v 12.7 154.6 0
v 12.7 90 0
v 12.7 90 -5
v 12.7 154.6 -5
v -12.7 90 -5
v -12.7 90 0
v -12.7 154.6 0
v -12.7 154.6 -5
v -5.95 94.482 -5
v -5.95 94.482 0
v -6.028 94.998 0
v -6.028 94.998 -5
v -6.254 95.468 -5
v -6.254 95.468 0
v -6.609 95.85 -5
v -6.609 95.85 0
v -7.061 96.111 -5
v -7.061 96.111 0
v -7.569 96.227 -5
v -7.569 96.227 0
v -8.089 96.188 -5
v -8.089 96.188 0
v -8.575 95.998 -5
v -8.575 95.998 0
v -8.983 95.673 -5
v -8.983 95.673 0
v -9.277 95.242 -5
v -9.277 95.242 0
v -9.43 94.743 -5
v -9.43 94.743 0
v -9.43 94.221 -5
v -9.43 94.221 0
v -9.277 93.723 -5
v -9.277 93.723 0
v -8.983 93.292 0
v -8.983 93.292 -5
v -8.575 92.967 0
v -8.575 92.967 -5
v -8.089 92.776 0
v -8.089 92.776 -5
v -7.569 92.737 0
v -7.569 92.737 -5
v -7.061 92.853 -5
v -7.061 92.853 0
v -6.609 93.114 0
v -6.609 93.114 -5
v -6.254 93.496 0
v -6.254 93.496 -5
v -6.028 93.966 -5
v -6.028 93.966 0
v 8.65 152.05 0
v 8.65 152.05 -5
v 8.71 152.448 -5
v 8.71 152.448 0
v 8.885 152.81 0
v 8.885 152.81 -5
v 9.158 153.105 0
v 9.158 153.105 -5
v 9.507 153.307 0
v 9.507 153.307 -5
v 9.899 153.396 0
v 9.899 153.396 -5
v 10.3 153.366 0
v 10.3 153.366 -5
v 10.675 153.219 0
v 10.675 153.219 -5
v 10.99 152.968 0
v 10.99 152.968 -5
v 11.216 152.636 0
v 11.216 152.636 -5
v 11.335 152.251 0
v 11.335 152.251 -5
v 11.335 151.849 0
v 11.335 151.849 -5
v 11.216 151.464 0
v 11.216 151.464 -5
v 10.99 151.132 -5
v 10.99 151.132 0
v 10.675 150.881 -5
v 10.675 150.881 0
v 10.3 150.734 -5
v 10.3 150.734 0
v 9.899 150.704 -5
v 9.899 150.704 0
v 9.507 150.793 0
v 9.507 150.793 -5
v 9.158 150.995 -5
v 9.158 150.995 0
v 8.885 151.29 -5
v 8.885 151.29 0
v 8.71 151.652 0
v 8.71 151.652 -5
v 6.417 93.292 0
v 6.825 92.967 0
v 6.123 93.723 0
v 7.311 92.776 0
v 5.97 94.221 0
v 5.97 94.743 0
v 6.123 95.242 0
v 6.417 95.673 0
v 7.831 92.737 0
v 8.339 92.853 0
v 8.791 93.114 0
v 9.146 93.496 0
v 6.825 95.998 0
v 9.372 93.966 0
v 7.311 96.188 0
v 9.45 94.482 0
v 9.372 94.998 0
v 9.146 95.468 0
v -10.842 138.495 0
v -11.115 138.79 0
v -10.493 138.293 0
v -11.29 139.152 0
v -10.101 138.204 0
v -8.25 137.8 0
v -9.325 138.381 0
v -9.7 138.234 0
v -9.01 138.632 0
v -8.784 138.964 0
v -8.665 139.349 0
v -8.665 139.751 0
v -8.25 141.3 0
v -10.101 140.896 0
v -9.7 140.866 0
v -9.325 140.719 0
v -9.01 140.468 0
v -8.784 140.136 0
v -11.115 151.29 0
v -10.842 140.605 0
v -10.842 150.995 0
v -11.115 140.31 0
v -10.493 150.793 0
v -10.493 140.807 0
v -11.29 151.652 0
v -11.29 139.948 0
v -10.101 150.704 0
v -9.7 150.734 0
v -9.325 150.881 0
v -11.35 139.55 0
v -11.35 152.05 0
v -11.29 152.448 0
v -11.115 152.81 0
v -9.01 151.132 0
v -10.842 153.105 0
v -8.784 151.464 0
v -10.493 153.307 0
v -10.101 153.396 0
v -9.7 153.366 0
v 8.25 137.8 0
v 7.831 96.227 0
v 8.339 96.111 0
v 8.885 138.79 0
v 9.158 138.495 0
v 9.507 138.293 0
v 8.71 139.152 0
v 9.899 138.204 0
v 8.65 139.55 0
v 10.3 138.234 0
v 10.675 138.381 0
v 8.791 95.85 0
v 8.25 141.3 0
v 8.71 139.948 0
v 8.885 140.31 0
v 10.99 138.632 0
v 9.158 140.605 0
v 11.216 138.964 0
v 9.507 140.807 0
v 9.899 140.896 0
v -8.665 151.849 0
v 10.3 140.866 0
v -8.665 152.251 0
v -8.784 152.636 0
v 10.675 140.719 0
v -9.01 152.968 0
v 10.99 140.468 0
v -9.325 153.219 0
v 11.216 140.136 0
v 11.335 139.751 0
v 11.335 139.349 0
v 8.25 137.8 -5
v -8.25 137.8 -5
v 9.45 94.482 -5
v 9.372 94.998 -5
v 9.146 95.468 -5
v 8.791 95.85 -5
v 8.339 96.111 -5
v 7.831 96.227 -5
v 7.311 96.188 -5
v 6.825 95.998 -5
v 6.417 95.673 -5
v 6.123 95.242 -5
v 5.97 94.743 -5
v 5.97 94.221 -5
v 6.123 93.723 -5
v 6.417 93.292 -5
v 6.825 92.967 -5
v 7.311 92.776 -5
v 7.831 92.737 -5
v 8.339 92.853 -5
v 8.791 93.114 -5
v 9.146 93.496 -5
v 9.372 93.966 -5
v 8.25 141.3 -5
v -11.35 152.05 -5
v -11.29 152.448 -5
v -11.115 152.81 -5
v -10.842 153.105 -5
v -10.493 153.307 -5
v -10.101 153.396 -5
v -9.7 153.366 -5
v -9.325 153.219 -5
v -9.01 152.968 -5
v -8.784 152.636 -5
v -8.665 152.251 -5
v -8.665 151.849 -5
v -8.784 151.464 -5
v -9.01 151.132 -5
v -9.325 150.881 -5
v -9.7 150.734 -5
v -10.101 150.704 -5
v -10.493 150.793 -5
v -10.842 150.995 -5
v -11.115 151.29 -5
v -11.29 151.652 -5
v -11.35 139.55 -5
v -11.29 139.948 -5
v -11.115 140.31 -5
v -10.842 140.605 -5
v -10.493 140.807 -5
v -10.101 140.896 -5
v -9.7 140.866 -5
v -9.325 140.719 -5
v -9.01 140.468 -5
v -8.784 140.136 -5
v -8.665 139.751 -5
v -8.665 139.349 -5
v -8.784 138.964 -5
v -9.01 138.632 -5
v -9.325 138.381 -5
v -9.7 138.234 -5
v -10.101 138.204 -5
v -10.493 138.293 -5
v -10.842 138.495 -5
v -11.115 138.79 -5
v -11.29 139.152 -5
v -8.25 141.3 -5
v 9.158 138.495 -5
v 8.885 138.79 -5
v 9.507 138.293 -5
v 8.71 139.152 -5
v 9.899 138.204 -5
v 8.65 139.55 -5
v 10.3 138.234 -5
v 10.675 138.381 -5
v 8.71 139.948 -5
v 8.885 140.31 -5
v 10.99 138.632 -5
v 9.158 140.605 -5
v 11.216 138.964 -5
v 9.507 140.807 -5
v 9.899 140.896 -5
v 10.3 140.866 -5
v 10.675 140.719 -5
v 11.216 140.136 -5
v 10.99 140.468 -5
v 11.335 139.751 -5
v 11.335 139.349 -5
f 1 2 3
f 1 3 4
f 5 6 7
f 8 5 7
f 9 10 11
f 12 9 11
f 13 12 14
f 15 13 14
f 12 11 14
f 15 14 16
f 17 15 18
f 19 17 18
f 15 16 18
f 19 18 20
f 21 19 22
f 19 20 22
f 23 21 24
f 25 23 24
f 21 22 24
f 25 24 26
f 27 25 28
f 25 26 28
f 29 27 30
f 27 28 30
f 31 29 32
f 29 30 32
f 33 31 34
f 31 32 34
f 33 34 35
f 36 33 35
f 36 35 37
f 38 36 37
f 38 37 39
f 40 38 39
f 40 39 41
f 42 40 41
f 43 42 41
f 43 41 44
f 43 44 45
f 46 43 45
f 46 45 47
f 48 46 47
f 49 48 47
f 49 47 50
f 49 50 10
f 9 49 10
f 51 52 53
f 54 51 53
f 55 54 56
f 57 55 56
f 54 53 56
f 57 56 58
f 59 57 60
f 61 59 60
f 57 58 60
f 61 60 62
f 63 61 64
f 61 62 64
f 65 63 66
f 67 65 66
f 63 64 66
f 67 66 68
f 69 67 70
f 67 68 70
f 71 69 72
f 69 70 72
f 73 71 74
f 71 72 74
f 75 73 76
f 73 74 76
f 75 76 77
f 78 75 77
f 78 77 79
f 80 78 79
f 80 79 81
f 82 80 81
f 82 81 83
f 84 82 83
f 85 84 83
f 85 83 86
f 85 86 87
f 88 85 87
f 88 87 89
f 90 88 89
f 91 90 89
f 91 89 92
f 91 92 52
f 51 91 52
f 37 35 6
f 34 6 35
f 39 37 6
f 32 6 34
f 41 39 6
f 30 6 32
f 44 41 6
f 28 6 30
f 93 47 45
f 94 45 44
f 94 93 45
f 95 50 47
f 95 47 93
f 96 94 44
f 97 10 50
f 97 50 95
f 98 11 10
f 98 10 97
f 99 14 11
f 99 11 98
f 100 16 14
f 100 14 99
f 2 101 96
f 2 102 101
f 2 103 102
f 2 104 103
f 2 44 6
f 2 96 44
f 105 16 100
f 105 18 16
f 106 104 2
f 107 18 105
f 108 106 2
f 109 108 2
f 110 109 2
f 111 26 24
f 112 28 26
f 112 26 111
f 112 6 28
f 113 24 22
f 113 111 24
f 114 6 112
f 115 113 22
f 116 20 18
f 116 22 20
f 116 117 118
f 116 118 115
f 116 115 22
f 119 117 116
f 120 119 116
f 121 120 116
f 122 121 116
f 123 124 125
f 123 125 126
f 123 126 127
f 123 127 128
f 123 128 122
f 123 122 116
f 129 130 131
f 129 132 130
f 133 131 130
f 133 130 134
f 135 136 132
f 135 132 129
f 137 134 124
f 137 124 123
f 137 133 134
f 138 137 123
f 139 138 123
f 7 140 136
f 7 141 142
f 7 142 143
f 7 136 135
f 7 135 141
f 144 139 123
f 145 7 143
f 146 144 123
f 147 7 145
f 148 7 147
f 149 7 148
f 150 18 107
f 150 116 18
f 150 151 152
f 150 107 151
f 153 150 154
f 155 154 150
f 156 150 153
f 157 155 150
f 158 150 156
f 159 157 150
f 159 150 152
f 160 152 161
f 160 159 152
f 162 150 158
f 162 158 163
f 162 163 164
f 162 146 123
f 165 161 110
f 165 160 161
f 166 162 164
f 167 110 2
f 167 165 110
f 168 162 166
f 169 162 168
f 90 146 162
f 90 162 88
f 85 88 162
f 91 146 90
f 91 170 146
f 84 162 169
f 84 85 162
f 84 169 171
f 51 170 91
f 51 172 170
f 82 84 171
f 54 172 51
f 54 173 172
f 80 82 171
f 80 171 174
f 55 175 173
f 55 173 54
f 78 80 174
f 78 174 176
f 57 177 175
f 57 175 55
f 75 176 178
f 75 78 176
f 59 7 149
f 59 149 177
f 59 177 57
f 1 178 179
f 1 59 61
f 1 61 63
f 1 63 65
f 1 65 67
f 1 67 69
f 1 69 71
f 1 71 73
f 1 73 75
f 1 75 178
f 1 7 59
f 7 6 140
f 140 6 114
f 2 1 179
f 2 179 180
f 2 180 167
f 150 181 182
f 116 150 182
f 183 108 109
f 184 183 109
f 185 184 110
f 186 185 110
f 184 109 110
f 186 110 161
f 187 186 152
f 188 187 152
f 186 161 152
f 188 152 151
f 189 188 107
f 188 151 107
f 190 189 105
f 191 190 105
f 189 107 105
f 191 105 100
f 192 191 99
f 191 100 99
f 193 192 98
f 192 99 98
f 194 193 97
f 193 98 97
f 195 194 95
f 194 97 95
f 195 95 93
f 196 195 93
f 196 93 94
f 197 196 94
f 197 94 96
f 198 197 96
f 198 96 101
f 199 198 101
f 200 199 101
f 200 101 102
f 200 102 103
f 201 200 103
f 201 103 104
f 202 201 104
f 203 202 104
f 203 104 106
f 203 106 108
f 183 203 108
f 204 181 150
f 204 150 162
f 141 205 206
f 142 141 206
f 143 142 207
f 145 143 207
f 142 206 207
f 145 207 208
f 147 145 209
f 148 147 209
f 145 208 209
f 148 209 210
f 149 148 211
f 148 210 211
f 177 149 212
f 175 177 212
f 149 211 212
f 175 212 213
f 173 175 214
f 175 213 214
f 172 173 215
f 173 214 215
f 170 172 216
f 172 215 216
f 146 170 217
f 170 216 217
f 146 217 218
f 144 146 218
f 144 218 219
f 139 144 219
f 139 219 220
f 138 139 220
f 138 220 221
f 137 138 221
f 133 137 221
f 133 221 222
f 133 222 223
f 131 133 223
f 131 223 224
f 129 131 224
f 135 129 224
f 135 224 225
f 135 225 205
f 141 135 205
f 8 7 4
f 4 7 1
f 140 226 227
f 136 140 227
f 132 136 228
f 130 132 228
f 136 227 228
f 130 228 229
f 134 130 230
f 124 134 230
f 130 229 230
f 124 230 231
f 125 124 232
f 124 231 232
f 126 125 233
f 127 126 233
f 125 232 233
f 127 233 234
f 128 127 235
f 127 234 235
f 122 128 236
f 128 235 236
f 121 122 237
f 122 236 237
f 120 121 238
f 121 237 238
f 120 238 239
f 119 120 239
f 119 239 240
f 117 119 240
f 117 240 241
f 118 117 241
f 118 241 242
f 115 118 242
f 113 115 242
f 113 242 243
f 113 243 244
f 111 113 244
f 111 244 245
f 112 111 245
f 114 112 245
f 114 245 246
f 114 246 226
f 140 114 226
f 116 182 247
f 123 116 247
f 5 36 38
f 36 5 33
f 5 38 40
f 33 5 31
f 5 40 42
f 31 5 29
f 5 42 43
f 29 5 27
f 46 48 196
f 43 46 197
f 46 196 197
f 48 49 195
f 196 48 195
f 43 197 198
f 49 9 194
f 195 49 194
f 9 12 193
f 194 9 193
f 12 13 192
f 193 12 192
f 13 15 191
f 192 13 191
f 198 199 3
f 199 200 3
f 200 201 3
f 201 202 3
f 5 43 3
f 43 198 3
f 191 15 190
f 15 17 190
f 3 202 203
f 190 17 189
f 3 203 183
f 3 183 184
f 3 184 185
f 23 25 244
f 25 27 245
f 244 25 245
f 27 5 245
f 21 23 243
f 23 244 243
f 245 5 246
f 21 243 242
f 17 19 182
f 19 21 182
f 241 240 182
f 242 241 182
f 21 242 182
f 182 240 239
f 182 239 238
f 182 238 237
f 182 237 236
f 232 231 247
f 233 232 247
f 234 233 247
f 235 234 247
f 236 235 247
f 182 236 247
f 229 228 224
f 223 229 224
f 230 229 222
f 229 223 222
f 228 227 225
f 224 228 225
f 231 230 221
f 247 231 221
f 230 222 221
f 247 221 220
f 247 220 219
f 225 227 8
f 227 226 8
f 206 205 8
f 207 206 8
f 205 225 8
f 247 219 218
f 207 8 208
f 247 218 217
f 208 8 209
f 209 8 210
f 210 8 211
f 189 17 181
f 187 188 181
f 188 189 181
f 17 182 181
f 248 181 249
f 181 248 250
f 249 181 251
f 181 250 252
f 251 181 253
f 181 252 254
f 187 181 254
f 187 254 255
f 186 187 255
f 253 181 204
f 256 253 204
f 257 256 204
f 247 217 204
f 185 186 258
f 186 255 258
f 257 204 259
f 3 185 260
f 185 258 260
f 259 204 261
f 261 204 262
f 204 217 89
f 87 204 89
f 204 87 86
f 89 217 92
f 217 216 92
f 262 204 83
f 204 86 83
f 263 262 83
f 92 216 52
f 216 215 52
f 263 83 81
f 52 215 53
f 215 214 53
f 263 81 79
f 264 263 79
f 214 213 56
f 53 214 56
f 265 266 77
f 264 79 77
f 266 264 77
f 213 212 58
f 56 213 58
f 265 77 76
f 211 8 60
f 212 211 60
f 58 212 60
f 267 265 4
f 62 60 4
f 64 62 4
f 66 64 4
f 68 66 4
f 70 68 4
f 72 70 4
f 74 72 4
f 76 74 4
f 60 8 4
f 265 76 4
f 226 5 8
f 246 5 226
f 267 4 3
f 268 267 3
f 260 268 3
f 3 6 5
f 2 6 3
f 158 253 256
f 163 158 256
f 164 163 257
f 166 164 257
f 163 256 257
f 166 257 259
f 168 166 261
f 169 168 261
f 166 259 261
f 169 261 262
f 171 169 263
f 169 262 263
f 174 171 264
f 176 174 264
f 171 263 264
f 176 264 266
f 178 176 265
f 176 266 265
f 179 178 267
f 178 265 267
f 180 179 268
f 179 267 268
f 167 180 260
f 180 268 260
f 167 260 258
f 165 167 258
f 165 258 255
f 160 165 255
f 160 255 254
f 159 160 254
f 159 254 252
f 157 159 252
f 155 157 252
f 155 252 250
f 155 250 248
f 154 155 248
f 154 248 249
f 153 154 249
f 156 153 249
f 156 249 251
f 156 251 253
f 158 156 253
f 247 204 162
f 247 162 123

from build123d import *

# Parameters (mm, degrees)
SKETCH1_W           = 25.4
SKETCH1_H           = 64.6
BOSS_EXTRUDE1_DEPTH = 5
SKETCH2_R           = 1.35
SKETCH2_W           = 16.5
SKETCH2_H           = 3.5
CUT_EXTRUDE1_DEPTH  = 6
SKETCH3_R           = 1.75
CUT_EXTRUDE2_DEPTH  = 6


with BuildPart() as part:
    # Sketch1 → Boss-Extrude1 (new body)
    with BuildSketch(Plane.XY):
        with Locations((0, 122.3)):
            Rectangle(SKETCH1_W, SKETCH1_H)
    extrude(amount=-BOSS_EXTRUDE1_DEPTH)

    # Sketch2 → Cut-Extrude1 (cut, through all)
    with BuildSketch(Plane(origin=(0, 0, -5), x_dir=(-1, 0, 0), z_dir=(0, 0, -1))):
        with Locations((-10, 152.05)):
            Circle(SKETCH2_R)
        with Locations((10, 152.05)):
            Circle(SKETCH2_R)
        with Locations((-10, 139.55)):
            Circle(SKETCH2_R)
        with Locations((10, 139.55)):
            Circle(SKETCH2_R)
        with Locations((0, 139.55)):
            Rectangle(SKETCH2_W, SKETCH2_H)
    extrude(amount=-CUT_EXTRUDE1_DEPTH, mode=Mode.SUBTRACT)

    # Sketch3 → Cut-Extrude2 (cut, through all)
    with BuildSketch(Plane.XY):
        with Locations((-7.7, 94.48222968)):
            Circle(SKETCH3_R)
        with Locations((7.7, 94.48222968)):
            Circle(SKETCH3_R)
    extrude(amount=-CUT_EXTRUDE2_DEPTH, mode=Mode.SUBTRACT)


solid = part.part
